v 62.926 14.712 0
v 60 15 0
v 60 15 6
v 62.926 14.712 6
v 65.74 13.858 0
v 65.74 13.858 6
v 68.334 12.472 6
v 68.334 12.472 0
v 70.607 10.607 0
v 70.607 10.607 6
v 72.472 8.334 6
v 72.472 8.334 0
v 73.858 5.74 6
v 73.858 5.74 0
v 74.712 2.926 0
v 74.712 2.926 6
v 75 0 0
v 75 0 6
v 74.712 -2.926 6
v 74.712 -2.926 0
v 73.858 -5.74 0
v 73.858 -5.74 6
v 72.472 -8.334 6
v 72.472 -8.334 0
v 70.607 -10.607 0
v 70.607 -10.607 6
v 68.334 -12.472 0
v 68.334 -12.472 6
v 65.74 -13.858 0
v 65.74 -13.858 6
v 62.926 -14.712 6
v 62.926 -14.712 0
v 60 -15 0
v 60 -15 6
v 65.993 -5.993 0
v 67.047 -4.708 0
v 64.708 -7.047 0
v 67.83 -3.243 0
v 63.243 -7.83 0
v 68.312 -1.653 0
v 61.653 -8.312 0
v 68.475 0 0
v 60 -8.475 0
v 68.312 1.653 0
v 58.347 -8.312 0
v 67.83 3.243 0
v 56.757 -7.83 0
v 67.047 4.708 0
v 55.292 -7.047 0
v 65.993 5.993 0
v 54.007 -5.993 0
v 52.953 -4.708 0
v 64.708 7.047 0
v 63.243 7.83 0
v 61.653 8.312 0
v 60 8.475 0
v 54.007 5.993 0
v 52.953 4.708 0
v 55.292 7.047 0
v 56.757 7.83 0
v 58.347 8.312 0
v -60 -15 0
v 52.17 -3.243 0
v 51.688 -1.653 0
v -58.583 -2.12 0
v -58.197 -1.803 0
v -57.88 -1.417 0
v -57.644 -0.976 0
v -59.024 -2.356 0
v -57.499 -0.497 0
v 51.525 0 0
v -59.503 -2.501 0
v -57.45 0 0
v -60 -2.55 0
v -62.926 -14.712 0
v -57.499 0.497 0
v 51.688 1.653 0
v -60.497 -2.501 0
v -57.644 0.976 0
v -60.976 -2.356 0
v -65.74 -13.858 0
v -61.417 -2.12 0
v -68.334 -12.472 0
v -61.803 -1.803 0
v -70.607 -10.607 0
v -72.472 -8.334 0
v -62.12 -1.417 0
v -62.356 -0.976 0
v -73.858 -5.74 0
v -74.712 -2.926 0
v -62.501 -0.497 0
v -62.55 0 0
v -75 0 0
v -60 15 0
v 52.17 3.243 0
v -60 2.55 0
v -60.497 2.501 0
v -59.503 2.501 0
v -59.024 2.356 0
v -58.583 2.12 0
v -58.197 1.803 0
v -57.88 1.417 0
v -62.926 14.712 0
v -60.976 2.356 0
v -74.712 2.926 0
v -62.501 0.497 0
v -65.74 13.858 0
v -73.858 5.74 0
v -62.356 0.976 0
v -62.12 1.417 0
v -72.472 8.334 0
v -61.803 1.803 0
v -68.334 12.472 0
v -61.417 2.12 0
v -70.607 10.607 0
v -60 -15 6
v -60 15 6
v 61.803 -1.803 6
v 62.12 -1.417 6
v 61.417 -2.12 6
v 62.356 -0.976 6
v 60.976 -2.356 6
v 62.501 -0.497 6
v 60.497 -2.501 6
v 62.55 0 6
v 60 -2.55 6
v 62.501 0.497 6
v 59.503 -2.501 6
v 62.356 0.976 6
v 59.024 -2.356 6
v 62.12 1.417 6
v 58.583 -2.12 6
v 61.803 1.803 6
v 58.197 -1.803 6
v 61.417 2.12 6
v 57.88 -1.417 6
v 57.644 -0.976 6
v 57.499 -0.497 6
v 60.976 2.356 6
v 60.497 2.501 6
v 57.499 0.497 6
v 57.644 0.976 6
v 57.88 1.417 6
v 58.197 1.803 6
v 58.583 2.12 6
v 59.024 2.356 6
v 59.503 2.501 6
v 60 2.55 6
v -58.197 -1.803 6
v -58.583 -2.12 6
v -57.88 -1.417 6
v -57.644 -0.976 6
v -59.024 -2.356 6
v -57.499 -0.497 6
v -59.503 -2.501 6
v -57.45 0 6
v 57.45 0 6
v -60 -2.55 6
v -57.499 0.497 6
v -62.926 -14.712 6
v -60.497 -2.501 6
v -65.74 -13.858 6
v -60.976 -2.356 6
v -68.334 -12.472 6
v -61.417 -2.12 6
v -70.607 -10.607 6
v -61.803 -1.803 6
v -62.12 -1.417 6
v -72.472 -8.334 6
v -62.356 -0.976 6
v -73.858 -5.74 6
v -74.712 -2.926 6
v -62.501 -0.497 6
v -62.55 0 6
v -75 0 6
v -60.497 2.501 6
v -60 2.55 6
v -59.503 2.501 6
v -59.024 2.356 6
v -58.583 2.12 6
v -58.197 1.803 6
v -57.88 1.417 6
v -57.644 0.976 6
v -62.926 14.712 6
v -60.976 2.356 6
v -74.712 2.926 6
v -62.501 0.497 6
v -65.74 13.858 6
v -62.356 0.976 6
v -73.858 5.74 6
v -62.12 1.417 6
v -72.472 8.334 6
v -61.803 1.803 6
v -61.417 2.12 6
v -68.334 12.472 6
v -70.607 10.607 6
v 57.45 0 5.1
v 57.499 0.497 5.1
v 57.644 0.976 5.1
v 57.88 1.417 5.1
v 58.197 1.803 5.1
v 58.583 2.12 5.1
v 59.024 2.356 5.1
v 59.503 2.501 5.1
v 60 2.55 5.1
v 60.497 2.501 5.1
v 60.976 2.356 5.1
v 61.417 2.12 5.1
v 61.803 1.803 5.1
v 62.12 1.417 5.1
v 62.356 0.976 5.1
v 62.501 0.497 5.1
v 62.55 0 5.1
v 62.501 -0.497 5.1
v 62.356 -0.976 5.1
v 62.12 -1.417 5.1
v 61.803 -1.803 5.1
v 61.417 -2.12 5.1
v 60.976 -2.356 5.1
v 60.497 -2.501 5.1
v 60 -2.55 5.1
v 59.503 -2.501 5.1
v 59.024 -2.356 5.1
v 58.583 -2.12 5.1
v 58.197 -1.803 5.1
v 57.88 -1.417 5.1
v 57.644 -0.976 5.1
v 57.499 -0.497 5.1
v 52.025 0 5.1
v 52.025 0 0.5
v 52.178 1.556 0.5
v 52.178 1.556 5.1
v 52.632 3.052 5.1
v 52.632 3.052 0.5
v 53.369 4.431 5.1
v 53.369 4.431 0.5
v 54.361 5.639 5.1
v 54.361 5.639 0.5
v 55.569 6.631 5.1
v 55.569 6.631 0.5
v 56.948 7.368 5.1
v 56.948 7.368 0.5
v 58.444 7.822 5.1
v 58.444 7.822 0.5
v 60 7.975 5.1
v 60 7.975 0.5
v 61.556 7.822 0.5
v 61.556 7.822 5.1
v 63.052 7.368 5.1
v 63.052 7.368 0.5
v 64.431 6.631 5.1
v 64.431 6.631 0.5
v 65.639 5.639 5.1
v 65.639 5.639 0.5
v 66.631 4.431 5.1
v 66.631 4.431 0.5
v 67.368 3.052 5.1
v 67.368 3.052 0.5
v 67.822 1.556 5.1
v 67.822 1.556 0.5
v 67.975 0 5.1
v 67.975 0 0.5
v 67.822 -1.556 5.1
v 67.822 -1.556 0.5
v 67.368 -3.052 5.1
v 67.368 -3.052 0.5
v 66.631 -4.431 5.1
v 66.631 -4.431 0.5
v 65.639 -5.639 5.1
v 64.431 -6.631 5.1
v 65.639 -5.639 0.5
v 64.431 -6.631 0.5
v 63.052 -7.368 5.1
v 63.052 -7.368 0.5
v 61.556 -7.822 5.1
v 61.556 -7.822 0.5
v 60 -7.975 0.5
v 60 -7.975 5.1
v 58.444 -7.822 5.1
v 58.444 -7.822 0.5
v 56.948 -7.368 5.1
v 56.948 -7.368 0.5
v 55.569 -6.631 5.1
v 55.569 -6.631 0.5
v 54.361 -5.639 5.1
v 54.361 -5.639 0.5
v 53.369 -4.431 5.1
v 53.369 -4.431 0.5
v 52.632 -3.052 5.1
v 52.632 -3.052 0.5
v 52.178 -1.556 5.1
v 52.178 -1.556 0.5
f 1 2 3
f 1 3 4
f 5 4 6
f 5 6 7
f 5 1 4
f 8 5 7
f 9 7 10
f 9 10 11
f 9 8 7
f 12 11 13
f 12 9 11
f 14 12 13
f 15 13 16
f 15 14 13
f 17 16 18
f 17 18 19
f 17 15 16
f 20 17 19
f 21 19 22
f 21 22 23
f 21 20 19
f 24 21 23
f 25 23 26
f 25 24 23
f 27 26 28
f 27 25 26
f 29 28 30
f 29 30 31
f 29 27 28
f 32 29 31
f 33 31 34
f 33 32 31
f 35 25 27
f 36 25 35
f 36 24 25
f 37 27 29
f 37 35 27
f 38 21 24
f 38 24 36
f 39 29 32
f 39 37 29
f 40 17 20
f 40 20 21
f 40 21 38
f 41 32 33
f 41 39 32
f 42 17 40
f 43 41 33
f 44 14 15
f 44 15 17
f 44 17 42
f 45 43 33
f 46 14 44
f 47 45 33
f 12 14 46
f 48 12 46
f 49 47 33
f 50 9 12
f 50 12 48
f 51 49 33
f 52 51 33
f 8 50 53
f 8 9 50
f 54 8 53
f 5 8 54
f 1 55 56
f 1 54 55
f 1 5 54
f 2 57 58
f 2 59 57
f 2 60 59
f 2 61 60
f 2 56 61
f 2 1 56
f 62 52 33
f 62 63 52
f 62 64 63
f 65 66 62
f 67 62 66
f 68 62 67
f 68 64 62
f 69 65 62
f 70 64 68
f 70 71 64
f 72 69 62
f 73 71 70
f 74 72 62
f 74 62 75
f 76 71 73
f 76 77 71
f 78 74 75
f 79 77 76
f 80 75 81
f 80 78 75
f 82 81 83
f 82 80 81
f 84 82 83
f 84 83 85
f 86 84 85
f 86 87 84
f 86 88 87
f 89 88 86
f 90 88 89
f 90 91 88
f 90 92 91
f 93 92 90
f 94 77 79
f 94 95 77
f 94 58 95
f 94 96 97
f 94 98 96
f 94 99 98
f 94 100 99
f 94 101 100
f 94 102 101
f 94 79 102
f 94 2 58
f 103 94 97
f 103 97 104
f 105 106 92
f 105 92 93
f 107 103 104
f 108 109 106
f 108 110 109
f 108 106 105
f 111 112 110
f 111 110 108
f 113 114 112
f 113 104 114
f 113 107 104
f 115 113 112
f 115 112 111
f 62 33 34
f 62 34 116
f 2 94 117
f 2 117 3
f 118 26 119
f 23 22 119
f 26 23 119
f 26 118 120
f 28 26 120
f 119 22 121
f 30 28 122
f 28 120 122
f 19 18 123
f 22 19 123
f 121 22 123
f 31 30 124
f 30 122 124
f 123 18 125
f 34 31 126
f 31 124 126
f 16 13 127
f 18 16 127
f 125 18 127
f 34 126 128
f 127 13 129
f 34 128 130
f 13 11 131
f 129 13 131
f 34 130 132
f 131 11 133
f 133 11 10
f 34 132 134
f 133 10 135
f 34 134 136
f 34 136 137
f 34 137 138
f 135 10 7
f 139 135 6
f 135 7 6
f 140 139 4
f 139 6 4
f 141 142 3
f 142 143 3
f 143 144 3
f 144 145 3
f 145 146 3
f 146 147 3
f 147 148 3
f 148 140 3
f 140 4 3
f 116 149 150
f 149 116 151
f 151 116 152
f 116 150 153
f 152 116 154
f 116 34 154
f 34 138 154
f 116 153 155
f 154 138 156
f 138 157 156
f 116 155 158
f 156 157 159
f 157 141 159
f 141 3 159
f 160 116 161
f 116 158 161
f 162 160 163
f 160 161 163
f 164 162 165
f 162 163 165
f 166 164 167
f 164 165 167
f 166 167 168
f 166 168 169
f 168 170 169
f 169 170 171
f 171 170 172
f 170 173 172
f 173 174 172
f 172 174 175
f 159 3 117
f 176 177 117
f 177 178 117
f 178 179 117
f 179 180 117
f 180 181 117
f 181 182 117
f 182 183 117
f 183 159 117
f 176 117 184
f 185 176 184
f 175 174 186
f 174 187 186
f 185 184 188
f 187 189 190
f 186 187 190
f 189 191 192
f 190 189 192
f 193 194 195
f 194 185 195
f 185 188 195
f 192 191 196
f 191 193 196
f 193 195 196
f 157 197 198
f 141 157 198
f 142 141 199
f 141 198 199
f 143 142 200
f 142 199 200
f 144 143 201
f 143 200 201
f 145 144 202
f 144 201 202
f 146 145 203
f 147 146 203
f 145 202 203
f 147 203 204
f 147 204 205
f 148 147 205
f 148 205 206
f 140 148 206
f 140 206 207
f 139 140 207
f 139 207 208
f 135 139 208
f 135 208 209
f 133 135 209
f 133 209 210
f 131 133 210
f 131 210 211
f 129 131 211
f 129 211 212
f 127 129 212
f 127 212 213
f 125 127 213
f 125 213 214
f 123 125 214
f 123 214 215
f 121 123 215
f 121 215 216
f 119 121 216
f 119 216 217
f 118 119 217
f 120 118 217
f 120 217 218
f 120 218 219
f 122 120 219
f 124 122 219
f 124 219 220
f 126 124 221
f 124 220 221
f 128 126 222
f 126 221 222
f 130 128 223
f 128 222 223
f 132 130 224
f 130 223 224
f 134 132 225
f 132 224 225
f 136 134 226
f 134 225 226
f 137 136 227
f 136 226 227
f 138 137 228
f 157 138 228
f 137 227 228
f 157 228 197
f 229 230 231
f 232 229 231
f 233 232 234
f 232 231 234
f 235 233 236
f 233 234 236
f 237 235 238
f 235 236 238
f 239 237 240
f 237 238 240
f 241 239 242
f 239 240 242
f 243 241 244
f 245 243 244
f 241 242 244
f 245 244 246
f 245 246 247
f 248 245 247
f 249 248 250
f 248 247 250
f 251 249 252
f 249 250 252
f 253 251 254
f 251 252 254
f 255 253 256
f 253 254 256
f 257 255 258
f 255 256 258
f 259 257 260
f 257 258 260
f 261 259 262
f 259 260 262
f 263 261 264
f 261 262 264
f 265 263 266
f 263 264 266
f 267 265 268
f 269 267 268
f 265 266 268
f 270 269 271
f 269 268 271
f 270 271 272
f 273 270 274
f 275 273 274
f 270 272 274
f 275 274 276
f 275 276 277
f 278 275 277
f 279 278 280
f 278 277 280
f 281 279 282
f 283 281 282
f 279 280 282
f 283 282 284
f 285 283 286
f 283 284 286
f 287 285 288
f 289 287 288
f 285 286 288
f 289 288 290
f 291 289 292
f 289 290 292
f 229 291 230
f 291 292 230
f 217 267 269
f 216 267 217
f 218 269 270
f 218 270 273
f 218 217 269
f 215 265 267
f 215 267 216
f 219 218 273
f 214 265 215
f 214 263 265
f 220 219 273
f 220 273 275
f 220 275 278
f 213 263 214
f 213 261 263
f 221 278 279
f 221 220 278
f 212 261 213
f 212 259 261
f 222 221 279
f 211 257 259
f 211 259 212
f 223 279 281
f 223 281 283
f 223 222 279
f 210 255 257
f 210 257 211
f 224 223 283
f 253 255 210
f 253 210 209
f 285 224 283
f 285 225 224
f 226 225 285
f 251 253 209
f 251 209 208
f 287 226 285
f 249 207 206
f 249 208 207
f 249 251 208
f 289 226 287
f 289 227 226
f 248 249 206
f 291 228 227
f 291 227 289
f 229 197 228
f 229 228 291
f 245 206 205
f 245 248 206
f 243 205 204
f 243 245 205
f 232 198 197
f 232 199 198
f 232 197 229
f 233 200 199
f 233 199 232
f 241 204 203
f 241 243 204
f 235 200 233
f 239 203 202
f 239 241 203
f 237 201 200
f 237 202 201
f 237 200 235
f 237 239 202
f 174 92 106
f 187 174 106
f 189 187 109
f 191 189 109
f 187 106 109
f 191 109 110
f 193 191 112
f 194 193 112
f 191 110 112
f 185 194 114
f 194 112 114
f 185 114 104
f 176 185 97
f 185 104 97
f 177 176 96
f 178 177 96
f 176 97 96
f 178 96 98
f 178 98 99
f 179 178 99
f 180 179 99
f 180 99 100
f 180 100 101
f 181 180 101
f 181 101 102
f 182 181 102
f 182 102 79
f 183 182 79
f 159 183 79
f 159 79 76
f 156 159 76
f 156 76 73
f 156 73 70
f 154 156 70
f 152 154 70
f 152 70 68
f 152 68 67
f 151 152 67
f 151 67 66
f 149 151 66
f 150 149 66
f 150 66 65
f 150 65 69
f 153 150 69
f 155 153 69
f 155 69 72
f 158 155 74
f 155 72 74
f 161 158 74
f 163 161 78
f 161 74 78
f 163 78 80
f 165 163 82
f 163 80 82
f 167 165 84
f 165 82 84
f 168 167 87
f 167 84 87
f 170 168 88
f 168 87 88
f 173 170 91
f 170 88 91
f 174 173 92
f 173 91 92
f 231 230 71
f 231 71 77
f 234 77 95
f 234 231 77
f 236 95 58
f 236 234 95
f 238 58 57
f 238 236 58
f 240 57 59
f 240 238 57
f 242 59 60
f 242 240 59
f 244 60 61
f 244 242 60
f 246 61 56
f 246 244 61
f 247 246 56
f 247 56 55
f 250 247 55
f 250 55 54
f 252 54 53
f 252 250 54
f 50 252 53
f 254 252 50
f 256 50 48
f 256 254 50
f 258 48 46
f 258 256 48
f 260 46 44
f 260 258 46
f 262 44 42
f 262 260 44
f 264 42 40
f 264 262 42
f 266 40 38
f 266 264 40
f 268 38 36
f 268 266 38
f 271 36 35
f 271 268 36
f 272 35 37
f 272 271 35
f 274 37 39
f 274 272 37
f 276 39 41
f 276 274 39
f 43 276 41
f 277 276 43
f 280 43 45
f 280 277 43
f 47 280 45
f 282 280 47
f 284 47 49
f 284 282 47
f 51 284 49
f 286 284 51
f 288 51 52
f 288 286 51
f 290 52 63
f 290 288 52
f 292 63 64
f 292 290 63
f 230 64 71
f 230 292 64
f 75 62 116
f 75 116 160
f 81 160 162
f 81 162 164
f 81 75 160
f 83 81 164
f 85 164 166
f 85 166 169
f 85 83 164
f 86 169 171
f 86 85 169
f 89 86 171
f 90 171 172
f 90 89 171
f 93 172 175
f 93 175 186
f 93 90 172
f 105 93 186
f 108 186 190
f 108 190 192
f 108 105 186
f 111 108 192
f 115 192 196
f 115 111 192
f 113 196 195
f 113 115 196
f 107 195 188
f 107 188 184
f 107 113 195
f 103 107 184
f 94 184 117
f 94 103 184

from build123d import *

# Parameters (mm, degrees)
BOSS_EXTRUDE1_DEPTH = 6
SKETCH9_R           = 7.975
CUT_EXTRUDE5_DEPTH  = 5.1
SKETCH10_R          = 2.55
CUT_EXTRUDE6_DEPTH  = 1.9
SKETCH11_R          = 2.55
CUT_EXTRUDE7_DEPTH  = 7
CHAMFER1_SIZE       = 0.5


with BuildPart() as part:
    # Sketch4 → Boss-Extrude1 (new body)
    with BuildSketch(Plane.XY):
        with BuildLine():
            Line((-60, 15), (60, 15))
            ThreePointArc((60, 15), (75, 0), (60, -15))
            Line((60, -15), (-60, -15))
            ThreePointArc((-60, -15), (-75, 0), (-60, 15))
        make_face()
    extrude(amount=BOSS_EXTRUDE1_DEPTH)

    # Sketch9 → Cut-Extrude5 (cut)
    with BuildSketch(Plane(origin=(0, 0, 0), x_dir=(-1, 0, 0), z_dir=(0, 0, -1))):
        with Locations((-60, 0)):
            Circle(SKETCH9_R)
    extrude(amount=-CUT_EXTRUDE5_DEPTH, mode=Mode.SUBTRACT)

    # Sketch10 → Cut-Extrude6 (cut, through all)
    with BuildSketch(Plane(origin=(0, 0, 5.1), x_dir=(-1, 0, 0), z_dir=(0, 0, -1))):
        with Locations((-60, 0)):
            Circle(SKETCH10_R)
    extrude(amount=-CUT_EXTRUDE6_DEPTH, mode=Mode.SUBTRACT)

    # Sketch11 → Cut-Extrude7 (cut, through all)
    with BuildSketch(Plane(origin=(0, 0, 0), x_dir=(-1, 0, 0), z_dir=(0, 0, -1))):
        with Locations((60, 0)):
            Circle(SKETCH11_R)
    extrude(amount=-CUT_EXTRUDE7_DEPTH, mode=Mode.SUBTRACT)

    # Chamfer1
    chamfer1_edges = [part.edges().sort_by_distance(p)[0] for p in [
        (67.975, 0, 0),
    ]]
    chamfer(chamfer1_edges, length=CHAMFER1_SIZE)


solid = part.part
